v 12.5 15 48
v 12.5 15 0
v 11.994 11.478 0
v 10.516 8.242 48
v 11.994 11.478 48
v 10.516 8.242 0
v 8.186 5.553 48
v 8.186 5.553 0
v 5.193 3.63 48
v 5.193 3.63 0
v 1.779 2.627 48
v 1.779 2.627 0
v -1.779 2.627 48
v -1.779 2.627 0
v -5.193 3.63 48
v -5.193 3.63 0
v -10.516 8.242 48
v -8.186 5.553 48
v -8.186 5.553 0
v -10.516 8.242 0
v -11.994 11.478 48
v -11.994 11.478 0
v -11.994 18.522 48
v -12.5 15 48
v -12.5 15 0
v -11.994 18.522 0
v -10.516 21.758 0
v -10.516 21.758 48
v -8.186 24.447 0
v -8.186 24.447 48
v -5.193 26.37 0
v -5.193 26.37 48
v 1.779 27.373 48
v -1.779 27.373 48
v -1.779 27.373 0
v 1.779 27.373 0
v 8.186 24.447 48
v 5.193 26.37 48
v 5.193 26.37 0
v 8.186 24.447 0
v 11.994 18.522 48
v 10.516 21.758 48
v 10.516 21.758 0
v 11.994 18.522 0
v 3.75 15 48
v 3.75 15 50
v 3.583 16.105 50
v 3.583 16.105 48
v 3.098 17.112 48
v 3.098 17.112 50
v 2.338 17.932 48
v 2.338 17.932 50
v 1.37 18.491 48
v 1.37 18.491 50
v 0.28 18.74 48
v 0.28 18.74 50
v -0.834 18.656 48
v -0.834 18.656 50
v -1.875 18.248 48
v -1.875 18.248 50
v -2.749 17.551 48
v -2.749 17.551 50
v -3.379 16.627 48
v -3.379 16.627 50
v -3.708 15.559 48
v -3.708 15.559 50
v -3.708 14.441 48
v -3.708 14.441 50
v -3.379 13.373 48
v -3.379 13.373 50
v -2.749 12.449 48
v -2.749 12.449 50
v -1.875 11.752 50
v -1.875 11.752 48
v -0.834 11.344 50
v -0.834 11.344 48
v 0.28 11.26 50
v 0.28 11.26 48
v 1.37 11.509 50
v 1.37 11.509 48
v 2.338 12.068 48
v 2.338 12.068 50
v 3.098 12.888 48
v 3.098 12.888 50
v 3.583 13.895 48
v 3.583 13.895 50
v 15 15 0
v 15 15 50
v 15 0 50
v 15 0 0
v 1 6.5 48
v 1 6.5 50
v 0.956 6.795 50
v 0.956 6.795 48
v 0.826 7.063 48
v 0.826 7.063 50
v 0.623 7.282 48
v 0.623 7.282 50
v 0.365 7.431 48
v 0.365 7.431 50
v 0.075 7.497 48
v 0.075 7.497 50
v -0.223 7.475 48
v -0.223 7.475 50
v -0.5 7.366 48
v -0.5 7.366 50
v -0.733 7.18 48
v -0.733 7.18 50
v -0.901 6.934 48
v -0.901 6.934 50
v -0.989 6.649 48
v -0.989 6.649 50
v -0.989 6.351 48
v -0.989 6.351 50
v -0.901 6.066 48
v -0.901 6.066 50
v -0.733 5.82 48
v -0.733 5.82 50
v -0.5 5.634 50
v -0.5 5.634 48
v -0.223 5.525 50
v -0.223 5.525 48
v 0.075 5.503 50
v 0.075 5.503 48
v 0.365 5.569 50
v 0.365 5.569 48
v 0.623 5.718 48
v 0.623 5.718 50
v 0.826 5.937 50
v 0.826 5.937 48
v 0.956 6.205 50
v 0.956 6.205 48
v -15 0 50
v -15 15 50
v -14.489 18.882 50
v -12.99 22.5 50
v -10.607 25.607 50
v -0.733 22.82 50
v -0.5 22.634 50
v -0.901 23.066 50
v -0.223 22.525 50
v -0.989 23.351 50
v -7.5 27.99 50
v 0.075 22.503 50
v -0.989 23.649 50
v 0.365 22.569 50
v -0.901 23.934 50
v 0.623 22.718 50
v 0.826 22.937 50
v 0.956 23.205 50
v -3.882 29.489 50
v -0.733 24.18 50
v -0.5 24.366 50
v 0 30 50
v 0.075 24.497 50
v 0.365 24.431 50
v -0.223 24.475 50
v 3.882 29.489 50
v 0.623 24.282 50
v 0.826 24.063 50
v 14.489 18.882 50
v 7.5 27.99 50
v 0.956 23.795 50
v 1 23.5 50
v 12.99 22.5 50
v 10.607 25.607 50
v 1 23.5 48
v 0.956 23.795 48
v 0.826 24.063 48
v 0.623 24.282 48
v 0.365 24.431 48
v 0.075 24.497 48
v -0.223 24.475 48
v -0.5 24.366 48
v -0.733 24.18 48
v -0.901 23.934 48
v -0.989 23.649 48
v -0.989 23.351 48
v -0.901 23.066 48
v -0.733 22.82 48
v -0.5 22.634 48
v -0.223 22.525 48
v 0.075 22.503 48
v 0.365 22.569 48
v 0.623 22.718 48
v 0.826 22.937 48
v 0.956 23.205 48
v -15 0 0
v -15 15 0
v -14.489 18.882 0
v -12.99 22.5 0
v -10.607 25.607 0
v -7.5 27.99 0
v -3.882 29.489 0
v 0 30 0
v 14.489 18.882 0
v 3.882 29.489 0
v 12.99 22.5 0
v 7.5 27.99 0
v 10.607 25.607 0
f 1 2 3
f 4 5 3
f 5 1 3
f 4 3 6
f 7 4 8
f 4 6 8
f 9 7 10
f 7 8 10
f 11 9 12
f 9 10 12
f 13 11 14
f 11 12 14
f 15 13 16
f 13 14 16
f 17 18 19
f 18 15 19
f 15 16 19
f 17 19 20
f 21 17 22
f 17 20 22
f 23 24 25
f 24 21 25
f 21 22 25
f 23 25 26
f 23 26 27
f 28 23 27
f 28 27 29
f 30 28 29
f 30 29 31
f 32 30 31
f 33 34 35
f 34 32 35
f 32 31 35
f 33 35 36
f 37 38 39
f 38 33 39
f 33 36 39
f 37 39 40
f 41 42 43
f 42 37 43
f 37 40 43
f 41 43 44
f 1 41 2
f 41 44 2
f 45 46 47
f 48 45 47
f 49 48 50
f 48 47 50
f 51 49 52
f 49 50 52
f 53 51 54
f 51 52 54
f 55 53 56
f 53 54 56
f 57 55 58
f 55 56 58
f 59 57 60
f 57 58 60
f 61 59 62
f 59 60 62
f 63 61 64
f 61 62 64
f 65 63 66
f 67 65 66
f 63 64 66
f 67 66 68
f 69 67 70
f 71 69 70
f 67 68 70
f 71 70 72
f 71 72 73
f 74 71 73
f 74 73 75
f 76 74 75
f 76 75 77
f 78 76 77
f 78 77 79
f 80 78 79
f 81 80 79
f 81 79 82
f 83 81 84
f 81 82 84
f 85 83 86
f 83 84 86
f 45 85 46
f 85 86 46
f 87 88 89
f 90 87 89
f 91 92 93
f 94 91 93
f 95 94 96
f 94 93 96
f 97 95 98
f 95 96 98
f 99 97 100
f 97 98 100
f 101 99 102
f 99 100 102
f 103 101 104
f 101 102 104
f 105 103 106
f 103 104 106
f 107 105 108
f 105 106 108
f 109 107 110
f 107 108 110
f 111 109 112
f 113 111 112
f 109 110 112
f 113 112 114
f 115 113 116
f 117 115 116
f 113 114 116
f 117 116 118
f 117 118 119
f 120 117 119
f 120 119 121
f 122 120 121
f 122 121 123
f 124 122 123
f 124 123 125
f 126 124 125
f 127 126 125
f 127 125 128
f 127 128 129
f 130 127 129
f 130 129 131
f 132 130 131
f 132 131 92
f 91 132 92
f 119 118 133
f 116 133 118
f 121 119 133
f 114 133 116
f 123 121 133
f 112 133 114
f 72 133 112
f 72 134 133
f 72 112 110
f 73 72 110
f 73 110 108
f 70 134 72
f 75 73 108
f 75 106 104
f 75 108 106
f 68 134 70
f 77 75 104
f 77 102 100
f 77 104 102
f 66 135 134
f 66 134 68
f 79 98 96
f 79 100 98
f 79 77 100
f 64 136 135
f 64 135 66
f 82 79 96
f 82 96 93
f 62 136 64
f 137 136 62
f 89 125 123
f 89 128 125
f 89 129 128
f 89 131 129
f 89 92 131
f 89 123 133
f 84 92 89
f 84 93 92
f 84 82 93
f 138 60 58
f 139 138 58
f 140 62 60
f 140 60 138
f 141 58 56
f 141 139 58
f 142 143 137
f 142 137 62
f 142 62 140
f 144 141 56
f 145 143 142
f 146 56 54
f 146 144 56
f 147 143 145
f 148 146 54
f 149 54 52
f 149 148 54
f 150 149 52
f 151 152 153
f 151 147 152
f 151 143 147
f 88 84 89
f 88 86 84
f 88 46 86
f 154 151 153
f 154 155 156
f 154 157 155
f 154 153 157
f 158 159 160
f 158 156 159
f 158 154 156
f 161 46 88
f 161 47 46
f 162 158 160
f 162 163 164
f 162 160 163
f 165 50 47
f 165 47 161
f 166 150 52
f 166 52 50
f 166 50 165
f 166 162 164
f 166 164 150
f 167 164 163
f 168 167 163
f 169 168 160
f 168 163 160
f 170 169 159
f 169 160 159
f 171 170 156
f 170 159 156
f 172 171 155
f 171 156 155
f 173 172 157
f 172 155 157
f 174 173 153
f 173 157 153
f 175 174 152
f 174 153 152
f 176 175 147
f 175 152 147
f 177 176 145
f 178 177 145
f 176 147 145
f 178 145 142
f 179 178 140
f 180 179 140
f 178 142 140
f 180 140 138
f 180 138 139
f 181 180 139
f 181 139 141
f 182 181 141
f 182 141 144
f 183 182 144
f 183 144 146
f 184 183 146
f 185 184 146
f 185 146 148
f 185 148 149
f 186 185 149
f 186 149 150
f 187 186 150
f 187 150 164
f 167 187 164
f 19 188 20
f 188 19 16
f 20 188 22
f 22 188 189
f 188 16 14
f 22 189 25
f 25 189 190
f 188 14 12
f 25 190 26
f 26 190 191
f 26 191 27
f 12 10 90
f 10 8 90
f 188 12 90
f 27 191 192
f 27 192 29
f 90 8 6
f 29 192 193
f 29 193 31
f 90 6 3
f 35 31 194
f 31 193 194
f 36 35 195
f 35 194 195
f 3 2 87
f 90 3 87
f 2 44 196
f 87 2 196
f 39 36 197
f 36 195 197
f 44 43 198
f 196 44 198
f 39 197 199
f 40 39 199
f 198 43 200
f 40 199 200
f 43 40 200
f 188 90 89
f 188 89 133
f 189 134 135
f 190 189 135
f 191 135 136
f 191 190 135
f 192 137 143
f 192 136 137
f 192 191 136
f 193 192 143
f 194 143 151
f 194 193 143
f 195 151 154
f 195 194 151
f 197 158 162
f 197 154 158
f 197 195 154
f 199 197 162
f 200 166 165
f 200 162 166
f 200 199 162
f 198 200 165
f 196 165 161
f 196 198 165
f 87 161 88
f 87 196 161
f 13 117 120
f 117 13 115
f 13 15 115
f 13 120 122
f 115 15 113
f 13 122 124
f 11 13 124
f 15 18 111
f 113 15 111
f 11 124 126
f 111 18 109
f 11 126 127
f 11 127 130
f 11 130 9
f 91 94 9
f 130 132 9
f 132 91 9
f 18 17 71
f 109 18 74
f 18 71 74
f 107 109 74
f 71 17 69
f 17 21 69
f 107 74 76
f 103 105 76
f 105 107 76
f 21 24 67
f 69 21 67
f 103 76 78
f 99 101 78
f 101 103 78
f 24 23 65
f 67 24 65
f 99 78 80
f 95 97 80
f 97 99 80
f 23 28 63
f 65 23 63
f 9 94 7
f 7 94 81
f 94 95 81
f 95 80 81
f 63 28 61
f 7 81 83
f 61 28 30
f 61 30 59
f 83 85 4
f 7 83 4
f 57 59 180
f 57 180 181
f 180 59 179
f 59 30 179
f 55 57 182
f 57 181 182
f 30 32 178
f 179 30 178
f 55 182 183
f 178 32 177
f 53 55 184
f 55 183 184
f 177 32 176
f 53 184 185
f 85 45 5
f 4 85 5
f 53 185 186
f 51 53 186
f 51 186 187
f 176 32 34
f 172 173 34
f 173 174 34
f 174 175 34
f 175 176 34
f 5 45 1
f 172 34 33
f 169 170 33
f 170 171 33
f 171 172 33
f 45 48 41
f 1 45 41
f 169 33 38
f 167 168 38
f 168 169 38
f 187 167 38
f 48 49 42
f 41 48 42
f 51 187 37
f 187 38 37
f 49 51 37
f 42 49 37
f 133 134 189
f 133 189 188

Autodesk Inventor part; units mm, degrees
ref_plane "YZ Plane" through (0, 0, 0) normal (1, 0, 0) x (0, 1, 0)
ref_plane "XZ Plane" through (0, 0, 0) normal (0, 1, 0) x (-1, 0, 0)
ref_plane "XY Plane" through (0, 0, 0) normal (0, 0, 1) x (1, 0, 0)
sketch "Sketch1" plane through (0, 0, 0) normal (0, 0, 1) x (1, 0, 0)
  circle A0 centre (0, 15) radius 12.5
  arc A1 (15, 15) -> (-15, 15) centre (0, 15) ccw
  line L0 (-15, 15) -> (-15, 0)
  line L1 (15, 15) -> (15, 0)
  line L2 (15, 0) -> (-15, 0)
  point P0 (0, 0)
  dimension "d0" = 25
  dimension "d1" = 30
  dimension "d2" = 15
extrude "Extrusion1" add sketch "Sketch1" along normal blind 50
sketch "Sketch2" plane through (0, 0, 50) normal (0, 0, 1) x (1, 0, 0)
  circle A0 centre (0, 15) radius 12.5 construction
  line L0 (0, 27.5) -> (0, 2.5) construction
  circle A1 centre (0, 15) radius 12.5
  point P0 (0, 0)
extrude "Extrusion2" add sketch "Sketch2" against normal blind 2
sketch "Sketch3" plane through (0, 0, 50) normal (0, 0, 1) x (1, 0, 0)
  circle A0 centre (0, 15) radius 12.5 construction
  line L0 (0, 2.5) -> (0, 27.5) construction
  circle A1 centre (0, 23.5) radius 1
  circle A2 centre (0, 6.5) radius 1
  circle A3 centre (0, 15) radius 3.75
  point P0 (0, 0)
  dimension "d7" = 2
  dimension "d8" = 2
  dimension "d9" = 8.5
  dimension "d10" = 17
  dimension "d11" = 7.5
extrude "Extrusion3" cut sketch "Sketch3" against normal blind 2.5
thread "Thread1" size "M2x0.4" class "6H" standard "ANSI Metric M Profile" full length
thread "Thread2" size "M2x0.4" class "6H" standard "ANSI Metric M Profile" full length
properties part number "bancada"
